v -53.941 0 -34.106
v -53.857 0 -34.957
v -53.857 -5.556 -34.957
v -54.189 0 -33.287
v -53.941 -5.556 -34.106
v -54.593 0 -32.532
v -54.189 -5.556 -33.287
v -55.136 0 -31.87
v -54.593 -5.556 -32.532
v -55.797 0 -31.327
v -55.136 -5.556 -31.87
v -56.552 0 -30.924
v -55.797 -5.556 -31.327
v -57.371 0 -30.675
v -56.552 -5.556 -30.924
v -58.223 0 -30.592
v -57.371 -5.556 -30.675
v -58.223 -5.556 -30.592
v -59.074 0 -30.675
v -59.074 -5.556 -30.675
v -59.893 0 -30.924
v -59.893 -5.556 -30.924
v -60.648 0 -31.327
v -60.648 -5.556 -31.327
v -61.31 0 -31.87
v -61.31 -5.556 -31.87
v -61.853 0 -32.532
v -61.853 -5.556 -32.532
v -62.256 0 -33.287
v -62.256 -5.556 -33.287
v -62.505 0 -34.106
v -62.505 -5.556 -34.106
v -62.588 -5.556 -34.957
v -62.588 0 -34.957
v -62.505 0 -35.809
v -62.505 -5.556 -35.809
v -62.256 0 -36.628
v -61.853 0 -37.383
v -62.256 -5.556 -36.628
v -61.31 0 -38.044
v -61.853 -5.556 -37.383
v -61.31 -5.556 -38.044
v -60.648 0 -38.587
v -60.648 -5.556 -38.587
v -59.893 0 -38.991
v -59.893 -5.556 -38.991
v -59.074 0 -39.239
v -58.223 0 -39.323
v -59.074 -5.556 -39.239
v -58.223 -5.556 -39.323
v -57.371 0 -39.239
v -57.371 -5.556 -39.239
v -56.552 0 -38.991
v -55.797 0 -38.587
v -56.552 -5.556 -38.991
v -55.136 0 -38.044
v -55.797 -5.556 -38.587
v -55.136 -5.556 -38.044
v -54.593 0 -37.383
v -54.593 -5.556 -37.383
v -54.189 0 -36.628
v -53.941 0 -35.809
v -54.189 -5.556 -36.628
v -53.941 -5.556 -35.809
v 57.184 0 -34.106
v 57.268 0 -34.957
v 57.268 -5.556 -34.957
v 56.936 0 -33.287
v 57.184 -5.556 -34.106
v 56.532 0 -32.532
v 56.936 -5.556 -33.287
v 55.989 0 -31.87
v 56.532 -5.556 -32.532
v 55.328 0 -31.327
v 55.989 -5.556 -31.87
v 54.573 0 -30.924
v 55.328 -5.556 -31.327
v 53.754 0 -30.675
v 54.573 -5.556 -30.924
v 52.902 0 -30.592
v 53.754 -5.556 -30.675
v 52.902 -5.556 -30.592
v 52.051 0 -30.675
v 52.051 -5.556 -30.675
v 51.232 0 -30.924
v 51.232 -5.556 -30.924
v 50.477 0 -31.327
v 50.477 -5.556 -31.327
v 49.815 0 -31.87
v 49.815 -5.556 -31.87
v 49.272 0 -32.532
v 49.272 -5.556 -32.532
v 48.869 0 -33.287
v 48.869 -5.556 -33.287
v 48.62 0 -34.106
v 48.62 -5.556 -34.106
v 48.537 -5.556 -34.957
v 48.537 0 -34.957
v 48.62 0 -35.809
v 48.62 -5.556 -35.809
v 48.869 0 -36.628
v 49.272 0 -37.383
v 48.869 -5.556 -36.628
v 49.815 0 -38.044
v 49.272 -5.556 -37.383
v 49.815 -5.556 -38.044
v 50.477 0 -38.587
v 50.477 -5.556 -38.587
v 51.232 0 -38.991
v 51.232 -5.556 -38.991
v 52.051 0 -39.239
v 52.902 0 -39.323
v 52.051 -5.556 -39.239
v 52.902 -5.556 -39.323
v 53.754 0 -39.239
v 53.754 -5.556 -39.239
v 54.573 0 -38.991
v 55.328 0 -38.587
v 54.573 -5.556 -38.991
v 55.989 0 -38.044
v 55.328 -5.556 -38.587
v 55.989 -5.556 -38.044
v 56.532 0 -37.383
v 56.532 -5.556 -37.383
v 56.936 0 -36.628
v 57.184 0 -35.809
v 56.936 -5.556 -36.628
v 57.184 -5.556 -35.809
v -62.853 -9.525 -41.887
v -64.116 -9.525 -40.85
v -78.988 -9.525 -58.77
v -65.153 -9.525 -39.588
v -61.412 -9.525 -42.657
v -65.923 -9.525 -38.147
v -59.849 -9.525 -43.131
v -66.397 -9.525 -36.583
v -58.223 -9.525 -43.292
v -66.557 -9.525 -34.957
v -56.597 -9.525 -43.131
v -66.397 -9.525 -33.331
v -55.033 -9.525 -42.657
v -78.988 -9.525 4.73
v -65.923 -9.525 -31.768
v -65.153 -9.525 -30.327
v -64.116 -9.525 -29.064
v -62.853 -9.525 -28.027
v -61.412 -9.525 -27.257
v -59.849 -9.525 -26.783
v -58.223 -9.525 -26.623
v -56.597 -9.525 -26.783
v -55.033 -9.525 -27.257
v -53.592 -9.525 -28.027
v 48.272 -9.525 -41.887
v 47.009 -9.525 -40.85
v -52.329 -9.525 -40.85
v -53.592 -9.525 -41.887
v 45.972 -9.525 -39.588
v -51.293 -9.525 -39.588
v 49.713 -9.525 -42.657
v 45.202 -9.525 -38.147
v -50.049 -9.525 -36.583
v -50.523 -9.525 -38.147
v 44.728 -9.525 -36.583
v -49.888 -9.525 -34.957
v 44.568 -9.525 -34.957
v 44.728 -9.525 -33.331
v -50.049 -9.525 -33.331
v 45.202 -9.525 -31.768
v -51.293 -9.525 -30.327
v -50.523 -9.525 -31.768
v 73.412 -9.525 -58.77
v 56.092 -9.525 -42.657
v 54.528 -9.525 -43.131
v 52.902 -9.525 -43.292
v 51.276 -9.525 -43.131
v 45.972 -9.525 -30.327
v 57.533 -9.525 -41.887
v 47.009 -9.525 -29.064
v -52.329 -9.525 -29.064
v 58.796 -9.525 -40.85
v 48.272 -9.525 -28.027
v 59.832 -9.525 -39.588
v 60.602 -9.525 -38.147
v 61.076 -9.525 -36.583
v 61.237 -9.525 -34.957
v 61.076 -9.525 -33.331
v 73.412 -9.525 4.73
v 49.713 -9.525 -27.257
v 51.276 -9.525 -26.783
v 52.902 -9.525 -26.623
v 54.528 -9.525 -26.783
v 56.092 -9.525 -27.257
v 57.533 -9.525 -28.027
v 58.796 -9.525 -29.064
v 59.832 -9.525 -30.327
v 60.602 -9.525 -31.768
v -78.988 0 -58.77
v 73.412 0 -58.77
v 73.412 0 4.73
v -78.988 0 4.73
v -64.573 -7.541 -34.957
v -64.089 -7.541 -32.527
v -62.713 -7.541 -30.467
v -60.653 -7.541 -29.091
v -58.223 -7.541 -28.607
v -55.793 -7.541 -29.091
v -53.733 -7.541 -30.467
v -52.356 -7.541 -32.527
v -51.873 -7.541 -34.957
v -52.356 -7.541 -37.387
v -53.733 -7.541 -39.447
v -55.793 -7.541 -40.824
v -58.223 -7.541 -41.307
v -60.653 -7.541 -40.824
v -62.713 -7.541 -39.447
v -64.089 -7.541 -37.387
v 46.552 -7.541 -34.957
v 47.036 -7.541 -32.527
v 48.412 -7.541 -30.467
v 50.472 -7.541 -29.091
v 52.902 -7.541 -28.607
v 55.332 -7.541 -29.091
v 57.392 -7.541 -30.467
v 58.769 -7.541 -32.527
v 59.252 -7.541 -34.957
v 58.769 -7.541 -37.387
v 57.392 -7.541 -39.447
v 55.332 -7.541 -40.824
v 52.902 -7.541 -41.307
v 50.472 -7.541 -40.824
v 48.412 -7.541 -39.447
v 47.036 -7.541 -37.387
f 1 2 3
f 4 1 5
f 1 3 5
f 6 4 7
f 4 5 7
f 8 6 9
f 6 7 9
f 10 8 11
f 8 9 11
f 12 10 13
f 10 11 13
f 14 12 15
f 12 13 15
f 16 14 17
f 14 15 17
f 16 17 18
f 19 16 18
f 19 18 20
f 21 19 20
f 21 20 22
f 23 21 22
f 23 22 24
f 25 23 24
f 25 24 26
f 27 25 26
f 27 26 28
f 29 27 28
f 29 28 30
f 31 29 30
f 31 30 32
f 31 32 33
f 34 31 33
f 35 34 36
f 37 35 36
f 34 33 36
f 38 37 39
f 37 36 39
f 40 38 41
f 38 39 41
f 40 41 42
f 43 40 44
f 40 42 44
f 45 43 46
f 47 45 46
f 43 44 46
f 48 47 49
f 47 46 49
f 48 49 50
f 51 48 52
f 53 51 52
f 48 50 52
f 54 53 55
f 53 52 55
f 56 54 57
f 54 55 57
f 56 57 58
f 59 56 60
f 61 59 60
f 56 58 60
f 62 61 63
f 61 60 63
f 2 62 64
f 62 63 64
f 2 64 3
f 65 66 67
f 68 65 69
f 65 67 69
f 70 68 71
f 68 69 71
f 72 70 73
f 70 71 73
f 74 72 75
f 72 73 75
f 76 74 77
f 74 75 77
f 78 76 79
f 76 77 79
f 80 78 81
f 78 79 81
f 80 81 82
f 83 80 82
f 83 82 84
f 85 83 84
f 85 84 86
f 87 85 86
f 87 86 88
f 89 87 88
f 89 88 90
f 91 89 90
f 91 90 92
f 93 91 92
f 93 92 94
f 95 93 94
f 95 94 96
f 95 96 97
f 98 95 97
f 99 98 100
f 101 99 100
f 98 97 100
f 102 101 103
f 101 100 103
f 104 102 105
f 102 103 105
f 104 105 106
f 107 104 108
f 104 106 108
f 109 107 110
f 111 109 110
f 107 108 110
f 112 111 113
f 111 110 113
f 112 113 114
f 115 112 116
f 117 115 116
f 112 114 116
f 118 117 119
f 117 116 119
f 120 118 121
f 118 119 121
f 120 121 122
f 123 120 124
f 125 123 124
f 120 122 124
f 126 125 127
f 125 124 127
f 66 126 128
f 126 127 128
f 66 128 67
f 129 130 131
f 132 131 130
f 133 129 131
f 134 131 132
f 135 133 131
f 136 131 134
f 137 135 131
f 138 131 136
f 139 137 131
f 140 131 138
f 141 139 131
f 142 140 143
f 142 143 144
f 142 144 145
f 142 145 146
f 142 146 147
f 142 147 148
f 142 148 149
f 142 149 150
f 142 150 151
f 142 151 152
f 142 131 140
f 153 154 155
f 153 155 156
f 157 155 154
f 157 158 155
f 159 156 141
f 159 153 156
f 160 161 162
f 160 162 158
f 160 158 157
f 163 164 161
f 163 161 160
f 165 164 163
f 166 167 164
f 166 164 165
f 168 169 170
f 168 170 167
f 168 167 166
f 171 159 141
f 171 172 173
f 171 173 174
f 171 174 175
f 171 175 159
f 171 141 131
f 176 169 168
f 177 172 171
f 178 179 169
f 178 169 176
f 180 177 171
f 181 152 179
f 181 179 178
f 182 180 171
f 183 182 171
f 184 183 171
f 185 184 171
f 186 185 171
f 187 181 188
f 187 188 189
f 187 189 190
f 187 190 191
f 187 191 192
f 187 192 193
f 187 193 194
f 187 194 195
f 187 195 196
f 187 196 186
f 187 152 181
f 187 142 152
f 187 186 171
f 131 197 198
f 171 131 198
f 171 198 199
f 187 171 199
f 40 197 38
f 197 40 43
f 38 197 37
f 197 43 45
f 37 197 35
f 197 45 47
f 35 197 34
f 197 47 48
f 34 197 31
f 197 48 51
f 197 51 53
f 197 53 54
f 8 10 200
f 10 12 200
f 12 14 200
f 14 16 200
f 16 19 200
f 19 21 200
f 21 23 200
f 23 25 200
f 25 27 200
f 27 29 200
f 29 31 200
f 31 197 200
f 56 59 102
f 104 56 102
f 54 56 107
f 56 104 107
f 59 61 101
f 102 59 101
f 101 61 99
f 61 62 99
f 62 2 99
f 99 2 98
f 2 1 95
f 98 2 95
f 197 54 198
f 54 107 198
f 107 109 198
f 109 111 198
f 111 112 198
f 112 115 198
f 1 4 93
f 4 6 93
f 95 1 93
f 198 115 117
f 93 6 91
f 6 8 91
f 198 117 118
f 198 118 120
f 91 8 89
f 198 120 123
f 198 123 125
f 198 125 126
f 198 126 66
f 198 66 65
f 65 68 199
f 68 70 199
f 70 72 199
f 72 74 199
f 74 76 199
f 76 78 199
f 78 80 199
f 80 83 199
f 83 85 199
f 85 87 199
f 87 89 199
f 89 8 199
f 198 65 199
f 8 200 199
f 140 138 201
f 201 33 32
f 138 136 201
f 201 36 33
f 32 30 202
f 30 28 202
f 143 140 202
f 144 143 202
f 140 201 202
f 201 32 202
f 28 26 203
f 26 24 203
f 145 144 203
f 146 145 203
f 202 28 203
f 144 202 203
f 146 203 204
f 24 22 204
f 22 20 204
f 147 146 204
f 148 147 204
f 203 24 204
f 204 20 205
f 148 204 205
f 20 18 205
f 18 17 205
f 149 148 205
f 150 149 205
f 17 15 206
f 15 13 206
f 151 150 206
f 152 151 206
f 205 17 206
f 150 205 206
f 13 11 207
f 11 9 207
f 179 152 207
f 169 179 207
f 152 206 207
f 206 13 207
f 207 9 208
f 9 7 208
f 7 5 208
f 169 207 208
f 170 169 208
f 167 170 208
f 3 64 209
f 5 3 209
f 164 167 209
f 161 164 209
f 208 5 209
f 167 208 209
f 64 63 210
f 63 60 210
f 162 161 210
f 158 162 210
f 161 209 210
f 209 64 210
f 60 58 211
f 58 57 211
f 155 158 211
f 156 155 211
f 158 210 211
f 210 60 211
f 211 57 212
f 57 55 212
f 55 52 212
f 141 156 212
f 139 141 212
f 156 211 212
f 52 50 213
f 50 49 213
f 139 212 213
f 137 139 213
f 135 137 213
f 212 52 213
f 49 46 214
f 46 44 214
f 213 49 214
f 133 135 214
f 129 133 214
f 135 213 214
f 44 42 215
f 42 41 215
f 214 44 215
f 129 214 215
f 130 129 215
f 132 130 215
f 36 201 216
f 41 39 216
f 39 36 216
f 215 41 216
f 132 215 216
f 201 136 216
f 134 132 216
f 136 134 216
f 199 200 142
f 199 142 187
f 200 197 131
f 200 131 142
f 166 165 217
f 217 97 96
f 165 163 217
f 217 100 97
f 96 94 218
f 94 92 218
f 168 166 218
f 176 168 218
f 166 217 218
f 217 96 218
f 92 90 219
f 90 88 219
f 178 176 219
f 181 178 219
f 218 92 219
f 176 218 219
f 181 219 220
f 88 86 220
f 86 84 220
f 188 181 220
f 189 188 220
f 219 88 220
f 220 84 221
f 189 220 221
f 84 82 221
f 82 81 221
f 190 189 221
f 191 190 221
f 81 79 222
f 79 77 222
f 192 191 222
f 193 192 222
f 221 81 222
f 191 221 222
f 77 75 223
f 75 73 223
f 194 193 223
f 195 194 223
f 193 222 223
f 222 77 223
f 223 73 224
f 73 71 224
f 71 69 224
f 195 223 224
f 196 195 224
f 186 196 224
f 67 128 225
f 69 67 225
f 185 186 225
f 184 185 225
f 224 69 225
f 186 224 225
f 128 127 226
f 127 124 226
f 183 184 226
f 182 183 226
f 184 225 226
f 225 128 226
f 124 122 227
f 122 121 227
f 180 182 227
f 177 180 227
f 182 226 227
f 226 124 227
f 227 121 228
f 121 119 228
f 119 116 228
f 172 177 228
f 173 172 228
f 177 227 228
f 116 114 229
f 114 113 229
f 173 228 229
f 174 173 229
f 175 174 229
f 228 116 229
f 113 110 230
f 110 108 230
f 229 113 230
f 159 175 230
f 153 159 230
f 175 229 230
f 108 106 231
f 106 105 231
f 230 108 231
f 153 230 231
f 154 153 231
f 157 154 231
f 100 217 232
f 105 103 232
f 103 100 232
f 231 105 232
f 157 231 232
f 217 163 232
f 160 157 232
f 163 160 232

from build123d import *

# Parameters (mm, degrees)
F0_W           = 152.4
F0_H           = 63.5
F1_DEPTH       = 9.525
F2_R           = 4.365625
F3_DEPTH       = 25.4
F4_D           = 8.73125
F4_CSINK_D     = 16.66875
F4_CSINK_ANGLE = 90


# Not quite as in the source:
# - a length typed as a fraction of an inch, garbled in the dataset ("3 / 203.2 mm" for 3/8 in), is restored


with BuildPart() as f1:
    # F0 (on Front) → F1 (new body)
    with BuildSketch(Plane.XZ):
        with Locations((-2.7878060937, -27.0196995885)):
            Rectangle(F0_W, F0_H)
    extrude(amount=F1_DEPTH)

    # F2 (on face) → F3 (cut)
    with BuildSketch(Plane.XZ.offset(9.525)):
        with Locations((52.9022132752, -34.9571995885)):
            Circle(F2_R)
        with Locations((-58.2227867248, -34.9571995885)):
            Circle(F2_R)
    extrude(amount=-F3_DEPTH, mode=Mode.SUBTRACT)

    # F4 (through all)
    with Locations(Plane.XZ.offset(9.525)):
        with Locations((52.9022132752, -34.9571995885), (-58.2227867248, -34.9571995885)):
            CounterSinkHole(F4_D / 2, F4_CSINK_D / 2, counter_sink_angle=F4_CSINK_ANGLE)


solid = f1.part
